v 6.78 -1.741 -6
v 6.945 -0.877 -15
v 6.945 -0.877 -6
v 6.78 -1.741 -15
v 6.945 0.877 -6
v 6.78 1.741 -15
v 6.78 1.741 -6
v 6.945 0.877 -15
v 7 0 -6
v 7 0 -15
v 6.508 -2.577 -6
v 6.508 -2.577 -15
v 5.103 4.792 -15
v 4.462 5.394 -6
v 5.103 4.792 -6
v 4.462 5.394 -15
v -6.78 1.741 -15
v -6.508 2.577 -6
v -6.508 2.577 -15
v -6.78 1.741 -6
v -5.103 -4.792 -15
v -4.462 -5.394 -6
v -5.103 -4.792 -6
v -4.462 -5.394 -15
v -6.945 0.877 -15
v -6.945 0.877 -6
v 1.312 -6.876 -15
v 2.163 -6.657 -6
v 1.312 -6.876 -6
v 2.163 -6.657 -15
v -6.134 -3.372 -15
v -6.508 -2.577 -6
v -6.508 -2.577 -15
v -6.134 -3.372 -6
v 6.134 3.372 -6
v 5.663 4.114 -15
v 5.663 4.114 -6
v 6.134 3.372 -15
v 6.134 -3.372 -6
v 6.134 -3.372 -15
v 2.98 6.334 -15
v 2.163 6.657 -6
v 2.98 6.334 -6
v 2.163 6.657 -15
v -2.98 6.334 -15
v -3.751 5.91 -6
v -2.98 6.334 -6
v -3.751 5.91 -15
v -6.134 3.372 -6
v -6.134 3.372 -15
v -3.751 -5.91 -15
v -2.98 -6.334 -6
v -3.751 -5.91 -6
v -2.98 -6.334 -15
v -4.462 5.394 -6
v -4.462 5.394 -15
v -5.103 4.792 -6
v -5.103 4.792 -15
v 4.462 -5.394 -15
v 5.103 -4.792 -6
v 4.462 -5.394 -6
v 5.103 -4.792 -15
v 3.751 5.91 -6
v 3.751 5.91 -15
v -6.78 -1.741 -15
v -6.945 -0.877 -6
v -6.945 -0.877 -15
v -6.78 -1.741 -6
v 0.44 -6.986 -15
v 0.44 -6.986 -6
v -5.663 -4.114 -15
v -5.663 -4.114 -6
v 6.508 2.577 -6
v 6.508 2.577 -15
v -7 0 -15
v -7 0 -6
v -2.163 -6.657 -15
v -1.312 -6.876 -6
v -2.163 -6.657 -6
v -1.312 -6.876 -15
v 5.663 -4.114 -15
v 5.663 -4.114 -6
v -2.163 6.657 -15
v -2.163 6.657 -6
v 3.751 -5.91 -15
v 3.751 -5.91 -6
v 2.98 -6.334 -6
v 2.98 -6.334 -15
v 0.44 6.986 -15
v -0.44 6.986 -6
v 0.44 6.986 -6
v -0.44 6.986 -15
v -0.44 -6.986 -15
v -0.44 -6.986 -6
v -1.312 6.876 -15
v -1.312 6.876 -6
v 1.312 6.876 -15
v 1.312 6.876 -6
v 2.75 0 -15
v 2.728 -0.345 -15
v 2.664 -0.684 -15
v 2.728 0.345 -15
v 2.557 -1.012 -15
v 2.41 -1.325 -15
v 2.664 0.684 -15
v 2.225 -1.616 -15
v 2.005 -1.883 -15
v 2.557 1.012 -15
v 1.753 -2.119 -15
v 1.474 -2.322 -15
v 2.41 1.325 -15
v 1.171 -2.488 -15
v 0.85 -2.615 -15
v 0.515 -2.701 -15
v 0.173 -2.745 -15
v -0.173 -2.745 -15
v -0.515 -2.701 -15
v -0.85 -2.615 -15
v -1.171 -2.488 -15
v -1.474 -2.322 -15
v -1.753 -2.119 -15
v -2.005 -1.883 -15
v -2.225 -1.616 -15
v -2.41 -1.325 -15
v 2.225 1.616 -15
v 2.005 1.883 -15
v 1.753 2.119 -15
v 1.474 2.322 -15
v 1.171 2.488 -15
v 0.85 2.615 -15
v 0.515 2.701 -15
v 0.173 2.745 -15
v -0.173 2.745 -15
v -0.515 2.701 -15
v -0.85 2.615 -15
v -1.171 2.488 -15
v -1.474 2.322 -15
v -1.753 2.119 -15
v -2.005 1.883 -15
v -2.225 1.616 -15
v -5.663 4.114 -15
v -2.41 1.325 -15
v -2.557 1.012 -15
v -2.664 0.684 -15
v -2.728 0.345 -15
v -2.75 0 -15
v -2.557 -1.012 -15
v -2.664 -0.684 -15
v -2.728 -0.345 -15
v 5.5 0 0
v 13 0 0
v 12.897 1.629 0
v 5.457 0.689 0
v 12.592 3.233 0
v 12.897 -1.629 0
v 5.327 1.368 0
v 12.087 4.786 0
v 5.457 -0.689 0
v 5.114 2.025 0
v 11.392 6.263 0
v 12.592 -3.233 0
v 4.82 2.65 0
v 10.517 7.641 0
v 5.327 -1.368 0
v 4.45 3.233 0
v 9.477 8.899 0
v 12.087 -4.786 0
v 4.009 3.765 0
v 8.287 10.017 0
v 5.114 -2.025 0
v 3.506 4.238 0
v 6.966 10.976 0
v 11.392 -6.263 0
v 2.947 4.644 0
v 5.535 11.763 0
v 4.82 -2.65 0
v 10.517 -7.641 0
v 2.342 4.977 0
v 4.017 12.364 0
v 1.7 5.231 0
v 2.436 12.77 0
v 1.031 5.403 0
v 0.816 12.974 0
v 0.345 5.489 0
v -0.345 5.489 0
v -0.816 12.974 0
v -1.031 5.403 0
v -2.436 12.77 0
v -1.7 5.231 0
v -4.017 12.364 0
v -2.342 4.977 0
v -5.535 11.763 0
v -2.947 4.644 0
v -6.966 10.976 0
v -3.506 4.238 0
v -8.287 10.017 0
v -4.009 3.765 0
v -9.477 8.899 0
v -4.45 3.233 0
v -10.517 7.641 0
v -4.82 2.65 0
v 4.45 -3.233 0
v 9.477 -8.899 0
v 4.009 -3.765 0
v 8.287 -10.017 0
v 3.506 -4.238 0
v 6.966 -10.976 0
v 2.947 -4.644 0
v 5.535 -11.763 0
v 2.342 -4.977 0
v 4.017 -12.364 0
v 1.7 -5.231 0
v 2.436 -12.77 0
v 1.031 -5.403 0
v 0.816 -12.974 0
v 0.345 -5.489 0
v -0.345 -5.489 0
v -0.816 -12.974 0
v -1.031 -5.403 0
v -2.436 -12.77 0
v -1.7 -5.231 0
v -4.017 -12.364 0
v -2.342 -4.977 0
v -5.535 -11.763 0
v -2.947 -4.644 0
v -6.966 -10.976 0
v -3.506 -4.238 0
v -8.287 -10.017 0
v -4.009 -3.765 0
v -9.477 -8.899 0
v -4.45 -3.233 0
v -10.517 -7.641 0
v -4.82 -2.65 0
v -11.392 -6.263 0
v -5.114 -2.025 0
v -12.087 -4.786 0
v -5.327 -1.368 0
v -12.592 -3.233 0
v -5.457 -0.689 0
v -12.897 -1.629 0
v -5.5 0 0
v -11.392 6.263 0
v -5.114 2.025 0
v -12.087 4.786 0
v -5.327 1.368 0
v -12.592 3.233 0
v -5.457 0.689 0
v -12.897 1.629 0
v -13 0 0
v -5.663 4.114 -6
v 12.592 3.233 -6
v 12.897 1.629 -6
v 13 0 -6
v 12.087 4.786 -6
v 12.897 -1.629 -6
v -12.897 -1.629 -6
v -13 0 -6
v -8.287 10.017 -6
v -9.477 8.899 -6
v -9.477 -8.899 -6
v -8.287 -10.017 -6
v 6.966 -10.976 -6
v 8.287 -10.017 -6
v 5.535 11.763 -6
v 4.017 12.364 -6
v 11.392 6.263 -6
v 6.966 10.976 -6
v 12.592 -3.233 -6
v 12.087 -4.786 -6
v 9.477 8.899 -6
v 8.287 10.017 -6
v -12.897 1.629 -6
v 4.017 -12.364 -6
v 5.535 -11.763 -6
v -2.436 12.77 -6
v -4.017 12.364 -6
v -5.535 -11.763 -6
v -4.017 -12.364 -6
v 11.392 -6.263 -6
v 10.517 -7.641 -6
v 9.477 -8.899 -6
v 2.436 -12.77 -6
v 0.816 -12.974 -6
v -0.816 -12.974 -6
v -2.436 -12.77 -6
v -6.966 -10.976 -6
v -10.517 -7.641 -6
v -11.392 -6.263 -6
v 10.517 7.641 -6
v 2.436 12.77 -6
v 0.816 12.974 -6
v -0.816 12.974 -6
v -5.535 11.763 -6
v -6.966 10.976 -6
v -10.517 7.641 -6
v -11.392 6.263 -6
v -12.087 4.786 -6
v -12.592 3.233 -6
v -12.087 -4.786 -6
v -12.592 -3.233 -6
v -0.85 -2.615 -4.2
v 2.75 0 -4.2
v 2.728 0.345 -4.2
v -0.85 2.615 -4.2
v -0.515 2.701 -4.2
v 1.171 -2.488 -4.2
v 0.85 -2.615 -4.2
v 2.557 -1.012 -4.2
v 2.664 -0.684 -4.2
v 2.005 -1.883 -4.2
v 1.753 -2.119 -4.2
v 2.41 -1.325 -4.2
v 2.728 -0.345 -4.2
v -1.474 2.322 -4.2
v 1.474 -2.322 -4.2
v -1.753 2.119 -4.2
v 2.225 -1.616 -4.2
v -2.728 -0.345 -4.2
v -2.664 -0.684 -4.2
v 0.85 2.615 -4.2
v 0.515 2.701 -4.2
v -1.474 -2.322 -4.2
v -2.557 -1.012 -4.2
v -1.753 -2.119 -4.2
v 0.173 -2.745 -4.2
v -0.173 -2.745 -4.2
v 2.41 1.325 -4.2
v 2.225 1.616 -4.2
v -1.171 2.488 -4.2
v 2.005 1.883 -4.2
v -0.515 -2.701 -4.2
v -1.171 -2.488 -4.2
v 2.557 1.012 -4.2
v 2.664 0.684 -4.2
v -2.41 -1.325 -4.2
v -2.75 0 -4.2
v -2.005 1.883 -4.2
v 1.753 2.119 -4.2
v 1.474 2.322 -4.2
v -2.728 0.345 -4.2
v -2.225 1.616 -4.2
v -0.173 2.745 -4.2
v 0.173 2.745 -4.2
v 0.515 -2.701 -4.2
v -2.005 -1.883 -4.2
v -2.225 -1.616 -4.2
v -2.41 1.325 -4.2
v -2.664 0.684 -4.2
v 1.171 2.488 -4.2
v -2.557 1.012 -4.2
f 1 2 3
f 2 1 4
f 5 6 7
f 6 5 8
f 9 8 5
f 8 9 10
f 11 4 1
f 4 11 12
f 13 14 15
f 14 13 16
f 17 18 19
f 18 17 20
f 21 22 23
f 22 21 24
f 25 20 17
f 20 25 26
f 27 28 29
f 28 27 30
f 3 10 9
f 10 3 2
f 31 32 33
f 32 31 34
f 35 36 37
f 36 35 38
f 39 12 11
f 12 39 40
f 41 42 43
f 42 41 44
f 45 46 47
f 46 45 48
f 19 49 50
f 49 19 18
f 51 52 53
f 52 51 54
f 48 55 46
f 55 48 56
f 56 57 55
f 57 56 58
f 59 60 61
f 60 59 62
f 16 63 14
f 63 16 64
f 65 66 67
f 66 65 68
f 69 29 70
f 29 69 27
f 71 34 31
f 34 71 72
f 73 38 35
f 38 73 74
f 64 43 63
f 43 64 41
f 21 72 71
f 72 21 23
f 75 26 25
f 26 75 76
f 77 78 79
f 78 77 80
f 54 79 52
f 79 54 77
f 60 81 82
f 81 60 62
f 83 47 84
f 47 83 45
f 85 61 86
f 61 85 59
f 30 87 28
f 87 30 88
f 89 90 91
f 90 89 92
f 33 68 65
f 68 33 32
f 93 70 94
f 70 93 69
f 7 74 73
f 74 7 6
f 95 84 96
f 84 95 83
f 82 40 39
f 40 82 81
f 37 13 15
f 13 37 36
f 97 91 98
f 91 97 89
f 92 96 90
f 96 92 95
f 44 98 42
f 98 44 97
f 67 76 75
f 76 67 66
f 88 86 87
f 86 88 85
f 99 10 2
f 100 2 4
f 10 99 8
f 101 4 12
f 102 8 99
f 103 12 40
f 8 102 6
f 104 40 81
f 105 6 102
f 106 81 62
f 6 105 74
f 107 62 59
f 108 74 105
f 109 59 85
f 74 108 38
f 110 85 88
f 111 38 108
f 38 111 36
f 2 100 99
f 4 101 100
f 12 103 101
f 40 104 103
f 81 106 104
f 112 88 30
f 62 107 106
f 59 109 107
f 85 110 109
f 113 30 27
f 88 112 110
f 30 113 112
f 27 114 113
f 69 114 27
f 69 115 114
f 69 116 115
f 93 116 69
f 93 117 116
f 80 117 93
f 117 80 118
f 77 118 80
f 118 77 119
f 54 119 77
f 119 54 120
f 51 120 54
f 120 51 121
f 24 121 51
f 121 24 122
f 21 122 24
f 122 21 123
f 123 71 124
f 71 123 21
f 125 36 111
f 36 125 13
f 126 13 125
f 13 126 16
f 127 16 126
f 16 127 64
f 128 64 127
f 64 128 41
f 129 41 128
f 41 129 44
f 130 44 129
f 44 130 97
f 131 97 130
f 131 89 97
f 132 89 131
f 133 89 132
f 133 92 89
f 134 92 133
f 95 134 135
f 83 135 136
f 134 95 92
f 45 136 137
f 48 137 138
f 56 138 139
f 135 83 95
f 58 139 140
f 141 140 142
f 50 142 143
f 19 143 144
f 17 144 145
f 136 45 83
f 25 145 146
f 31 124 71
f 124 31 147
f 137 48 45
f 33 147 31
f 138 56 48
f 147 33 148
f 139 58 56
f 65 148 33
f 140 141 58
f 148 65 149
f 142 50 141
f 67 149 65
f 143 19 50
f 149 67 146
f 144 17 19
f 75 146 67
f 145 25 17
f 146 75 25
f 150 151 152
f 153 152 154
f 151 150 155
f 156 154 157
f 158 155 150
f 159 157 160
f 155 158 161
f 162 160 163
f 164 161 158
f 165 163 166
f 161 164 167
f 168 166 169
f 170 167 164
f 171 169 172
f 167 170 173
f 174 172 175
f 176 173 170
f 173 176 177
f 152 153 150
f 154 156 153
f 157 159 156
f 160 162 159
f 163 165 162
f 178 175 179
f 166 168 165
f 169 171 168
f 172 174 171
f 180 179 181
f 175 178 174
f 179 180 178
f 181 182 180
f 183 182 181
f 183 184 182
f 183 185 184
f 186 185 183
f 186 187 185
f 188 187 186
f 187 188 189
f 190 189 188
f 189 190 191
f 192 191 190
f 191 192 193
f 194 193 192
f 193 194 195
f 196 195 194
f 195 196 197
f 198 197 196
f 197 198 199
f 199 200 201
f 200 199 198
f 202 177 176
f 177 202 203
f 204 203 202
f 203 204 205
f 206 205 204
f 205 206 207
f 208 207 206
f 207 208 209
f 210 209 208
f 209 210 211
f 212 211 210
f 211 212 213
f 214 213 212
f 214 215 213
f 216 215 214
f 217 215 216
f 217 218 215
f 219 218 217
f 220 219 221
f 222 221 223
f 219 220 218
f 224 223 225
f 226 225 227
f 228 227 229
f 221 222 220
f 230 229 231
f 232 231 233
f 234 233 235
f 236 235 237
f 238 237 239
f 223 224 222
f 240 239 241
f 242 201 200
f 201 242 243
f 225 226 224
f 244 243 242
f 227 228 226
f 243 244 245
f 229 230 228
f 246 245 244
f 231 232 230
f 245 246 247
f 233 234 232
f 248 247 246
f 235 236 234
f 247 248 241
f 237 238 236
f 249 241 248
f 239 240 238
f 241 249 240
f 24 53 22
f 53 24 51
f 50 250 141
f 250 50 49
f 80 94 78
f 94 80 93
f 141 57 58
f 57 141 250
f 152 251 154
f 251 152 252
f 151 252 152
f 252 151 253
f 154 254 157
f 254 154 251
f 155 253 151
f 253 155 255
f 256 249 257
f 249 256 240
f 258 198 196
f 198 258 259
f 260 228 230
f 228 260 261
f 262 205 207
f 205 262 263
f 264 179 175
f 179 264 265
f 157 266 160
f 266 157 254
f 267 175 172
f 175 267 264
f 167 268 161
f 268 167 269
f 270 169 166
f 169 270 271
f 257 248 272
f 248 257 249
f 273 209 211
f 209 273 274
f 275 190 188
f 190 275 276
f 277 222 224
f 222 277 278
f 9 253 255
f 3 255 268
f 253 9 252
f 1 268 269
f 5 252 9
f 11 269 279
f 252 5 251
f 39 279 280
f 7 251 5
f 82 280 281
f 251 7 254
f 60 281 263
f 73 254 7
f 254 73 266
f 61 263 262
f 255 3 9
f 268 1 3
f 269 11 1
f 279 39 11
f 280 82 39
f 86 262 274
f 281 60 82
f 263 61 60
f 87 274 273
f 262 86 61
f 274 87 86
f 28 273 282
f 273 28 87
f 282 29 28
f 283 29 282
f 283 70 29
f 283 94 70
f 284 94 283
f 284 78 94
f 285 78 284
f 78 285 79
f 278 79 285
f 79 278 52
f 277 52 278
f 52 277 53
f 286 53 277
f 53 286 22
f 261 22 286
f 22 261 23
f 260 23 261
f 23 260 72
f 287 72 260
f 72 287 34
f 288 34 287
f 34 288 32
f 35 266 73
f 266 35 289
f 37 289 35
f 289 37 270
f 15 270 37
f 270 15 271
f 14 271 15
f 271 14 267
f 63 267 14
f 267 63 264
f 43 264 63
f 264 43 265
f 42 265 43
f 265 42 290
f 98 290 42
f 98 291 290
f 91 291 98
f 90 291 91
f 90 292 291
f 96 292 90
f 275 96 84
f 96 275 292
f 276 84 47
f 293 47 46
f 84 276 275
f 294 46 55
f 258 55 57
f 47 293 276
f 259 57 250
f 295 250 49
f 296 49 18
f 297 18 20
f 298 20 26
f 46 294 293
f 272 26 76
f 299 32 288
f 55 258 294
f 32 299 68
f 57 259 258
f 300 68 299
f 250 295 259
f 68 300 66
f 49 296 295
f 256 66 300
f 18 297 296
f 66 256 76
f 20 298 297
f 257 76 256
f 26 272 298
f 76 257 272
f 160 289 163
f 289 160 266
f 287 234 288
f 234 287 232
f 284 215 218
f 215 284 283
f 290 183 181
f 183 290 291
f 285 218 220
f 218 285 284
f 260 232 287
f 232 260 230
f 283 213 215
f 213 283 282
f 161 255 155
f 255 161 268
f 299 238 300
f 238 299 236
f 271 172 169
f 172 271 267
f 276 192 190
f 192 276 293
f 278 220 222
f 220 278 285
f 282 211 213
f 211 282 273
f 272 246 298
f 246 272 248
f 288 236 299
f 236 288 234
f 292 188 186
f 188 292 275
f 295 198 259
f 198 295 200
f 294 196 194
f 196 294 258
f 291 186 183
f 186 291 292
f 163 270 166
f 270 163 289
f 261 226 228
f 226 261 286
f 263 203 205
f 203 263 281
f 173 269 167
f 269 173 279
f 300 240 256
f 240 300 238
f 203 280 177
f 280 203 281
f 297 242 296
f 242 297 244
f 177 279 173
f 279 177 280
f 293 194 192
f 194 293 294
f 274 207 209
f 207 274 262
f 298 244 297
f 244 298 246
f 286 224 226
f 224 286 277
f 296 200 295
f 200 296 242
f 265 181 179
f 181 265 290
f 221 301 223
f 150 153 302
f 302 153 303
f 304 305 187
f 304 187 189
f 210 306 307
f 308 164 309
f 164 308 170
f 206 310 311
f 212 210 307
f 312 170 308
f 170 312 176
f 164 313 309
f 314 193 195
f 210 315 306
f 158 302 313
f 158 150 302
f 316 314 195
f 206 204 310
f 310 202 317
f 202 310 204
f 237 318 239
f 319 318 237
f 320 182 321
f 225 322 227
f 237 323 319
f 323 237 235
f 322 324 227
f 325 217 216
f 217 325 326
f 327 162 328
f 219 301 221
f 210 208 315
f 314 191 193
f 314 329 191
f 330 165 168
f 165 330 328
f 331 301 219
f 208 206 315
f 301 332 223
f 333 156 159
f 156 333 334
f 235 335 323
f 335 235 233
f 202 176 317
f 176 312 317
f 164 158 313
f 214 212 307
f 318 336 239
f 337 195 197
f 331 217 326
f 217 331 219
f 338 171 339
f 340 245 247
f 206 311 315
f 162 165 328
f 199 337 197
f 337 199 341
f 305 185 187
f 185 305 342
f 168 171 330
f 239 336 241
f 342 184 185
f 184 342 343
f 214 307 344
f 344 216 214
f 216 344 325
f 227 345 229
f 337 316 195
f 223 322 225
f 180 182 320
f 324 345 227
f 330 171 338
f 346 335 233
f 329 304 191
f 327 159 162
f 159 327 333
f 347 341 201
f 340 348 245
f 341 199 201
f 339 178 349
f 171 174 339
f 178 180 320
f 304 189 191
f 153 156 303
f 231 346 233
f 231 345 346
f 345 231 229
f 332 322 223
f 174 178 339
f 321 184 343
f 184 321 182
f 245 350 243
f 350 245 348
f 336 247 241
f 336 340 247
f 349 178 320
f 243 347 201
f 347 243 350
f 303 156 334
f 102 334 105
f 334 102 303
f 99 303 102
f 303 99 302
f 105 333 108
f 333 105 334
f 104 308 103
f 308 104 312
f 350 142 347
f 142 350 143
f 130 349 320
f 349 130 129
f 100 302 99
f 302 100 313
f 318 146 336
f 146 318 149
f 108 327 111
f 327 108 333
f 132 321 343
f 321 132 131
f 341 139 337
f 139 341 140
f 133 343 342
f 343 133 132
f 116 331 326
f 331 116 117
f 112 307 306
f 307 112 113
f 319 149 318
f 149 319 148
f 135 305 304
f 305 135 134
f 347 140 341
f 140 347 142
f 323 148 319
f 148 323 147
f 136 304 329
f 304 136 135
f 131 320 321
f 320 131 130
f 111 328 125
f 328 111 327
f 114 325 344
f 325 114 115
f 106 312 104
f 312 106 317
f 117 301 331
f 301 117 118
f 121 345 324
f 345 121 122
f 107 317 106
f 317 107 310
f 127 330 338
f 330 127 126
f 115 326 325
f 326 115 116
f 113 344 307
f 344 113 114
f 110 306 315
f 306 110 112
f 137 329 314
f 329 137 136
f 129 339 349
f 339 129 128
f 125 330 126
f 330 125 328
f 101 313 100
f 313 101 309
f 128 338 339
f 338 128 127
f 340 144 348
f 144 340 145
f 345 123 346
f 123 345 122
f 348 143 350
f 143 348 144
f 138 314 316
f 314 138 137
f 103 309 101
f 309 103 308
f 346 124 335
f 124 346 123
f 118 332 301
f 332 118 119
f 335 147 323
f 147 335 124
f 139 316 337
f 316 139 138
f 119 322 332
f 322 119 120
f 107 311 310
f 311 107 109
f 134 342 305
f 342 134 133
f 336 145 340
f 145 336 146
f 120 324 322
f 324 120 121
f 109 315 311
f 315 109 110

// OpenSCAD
$fn = 50;


difference() {
	union() {
		translate(v = [0, 0, -15.0000000000]) {
			cylinder(h = 15, r = 7.0000000000);
		}
		translate(v = [0, 0, -6.0000000000]) {
			cylinder(h = 6, r = 13.0000000000);
		}
	}
	union() {
		translate(v = [0, 0, 0]) {
			rotate(a = [0, 0, 0]) {
				difference() {
					union() {
						#translate(v = [0, 0, -15.0000000000]) {
							cylinder(h = 15, r = 2.2500000000);
						}
						#translate(v = [0, 0, -4.2000000000]) {
							cylinder(h = 4.2000000000, r = 7.0000000000, r1 = 2.7500000000, r2 = 5.5000000000);
						}
						#translate(v = [0, 0, -15.0000000000]) {
							cylinder(h = 15, r = 2.7500000000);
						}
						#translate(v = [0, 0, -15.0000000000]) {
							cylinder(h = 15, r = 2.2500000000);
						}
					}
					union();
				}
			}
		}
	}
}
